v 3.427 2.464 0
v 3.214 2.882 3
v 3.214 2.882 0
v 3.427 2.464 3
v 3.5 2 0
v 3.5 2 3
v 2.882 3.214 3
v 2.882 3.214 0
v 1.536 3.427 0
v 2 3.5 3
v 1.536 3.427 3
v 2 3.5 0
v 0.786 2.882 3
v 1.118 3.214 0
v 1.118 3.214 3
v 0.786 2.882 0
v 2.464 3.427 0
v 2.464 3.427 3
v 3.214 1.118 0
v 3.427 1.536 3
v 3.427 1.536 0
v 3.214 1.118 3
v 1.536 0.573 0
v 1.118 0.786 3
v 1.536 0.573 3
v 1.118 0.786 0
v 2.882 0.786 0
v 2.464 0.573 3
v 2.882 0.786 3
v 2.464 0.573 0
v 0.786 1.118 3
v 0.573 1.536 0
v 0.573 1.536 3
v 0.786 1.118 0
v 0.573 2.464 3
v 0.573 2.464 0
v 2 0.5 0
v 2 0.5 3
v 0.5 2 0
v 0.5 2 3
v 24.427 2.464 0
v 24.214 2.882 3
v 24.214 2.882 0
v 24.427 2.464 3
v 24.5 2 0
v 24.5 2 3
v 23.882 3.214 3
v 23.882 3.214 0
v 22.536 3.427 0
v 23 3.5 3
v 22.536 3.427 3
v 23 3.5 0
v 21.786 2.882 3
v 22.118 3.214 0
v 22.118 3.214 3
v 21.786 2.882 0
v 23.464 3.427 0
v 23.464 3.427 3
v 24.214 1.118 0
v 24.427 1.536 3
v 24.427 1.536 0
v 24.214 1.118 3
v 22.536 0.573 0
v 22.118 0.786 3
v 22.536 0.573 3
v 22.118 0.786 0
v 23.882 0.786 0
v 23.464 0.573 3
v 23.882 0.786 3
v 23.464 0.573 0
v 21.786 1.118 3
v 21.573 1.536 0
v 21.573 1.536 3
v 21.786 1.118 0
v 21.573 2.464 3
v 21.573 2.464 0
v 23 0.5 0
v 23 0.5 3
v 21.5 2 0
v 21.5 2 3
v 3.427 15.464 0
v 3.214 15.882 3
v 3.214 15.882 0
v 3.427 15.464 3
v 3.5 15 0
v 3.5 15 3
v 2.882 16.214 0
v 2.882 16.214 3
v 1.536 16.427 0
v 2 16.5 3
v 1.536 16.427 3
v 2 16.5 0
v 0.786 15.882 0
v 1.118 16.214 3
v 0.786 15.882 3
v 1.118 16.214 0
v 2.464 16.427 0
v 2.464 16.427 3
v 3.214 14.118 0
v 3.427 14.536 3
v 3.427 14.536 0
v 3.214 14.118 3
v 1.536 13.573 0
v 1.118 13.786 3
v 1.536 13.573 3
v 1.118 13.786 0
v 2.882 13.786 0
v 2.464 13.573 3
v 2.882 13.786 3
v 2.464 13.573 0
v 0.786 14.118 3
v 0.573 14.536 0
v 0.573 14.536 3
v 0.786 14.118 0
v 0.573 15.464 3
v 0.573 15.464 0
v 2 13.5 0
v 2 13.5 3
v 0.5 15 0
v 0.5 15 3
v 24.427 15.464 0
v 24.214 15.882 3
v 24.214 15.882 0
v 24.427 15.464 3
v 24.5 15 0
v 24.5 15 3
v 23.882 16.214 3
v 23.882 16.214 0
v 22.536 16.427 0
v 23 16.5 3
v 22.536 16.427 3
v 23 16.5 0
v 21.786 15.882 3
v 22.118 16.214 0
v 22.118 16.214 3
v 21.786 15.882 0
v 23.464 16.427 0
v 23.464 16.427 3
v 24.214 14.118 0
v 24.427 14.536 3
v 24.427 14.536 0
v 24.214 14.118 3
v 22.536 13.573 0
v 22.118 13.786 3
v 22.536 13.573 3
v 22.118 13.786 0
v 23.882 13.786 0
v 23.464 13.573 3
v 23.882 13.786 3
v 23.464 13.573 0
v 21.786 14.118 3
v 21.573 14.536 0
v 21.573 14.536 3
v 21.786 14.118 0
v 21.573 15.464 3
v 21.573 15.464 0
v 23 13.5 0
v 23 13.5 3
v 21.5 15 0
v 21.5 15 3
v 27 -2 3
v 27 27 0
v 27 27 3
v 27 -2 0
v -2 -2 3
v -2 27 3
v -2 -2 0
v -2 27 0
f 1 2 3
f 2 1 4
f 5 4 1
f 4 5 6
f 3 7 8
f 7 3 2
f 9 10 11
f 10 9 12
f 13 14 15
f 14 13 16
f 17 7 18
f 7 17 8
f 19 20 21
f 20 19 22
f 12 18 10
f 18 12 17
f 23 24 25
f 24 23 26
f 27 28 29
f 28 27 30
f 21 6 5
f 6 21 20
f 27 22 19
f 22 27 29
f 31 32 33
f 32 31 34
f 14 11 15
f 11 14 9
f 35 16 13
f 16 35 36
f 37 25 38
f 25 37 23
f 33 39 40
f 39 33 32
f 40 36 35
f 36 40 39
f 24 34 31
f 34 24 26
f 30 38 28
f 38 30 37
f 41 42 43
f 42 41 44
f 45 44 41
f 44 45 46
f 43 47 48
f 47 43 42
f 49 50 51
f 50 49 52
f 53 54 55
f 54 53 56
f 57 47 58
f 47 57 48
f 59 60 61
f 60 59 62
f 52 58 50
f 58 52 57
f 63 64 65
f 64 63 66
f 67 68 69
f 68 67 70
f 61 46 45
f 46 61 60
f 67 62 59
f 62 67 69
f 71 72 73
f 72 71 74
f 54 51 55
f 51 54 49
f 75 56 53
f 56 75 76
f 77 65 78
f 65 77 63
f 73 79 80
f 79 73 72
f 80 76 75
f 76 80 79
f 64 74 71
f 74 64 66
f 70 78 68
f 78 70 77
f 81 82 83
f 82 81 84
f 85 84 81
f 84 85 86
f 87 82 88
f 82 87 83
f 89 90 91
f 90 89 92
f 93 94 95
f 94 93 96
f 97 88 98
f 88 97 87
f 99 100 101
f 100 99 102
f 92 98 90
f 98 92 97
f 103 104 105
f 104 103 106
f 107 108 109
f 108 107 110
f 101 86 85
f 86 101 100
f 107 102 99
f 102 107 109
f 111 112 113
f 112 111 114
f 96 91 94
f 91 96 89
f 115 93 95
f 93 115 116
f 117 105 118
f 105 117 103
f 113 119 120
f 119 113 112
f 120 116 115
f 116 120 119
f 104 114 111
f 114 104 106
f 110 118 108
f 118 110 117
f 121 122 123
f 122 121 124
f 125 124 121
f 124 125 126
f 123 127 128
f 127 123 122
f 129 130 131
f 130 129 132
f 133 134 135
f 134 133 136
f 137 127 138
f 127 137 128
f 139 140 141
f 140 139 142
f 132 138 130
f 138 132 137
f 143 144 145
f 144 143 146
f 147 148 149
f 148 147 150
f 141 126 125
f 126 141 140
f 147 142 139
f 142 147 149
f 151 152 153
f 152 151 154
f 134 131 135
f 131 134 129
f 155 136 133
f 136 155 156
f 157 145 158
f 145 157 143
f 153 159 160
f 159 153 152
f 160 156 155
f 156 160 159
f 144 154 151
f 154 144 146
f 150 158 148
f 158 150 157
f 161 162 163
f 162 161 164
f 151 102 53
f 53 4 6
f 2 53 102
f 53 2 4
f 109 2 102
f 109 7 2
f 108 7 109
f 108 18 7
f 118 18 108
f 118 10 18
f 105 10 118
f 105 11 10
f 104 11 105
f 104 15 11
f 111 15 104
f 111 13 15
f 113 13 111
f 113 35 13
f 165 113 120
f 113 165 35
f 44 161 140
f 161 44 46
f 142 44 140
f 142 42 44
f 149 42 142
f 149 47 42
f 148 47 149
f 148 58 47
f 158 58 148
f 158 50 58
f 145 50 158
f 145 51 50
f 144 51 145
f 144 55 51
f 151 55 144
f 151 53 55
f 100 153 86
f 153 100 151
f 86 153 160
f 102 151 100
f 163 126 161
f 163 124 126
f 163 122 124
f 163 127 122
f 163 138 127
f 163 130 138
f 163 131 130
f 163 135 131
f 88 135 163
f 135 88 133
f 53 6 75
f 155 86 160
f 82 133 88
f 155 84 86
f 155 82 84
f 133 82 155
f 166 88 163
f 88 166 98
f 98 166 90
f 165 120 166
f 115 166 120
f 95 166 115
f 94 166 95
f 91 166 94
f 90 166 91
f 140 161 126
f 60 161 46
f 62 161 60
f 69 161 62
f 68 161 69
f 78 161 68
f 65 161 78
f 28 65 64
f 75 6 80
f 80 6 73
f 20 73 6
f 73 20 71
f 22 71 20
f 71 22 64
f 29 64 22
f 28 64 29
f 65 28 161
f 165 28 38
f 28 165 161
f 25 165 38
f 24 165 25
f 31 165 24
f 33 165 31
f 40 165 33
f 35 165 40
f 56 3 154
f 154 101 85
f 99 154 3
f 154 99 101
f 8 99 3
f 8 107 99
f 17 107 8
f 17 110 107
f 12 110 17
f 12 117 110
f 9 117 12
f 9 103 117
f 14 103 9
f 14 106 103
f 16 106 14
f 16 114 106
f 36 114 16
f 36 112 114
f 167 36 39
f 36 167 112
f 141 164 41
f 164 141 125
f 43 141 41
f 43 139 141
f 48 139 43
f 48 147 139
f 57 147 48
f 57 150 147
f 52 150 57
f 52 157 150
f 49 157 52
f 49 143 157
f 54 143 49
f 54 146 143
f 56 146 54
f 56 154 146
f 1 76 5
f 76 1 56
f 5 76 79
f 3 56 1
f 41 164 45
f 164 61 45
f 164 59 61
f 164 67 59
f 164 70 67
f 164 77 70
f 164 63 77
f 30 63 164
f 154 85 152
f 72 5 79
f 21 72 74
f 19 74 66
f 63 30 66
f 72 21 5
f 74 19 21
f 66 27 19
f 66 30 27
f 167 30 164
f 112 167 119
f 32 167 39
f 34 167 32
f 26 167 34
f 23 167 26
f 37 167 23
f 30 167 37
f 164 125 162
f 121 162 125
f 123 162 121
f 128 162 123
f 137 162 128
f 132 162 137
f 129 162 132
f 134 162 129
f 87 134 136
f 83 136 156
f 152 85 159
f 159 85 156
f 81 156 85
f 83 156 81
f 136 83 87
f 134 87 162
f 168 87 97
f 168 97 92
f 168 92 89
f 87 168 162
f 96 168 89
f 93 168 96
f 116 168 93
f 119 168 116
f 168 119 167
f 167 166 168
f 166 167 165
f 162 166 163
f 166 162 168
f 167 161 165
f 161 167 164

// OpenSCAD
/// Camera holder piece for a Raspberry PI camera module (non-HQ)
$fn=20;

// height is along the axis of the camera connector
camera_board_height = 25;
camera_board_width = 25;

mounting_holes_radius = 1.5;
// Shared x offset by outer and inner mounting holes
mounting_holes_x_offset = 2;
mounting_holes_y_offset_outer = 2;
mounting_holes_y_offset_inner = 15;

camera_holder_depth = 3;
// Padding per x and y side
// (e.g. padding of 2 will result in total padding of 4 along the axis)
camera_holder_padding = 2;

camera_holder();

module camera_holder() {
    difference(){
        translate([-camera_holder_padding, -camera_holder_padding, 0]){
            cube([
                camera_board_height + camera_holder_padding * 2,
                camera_board_width + camera_holder_padding * 2,
                camera_holder_depth,
            ]);
        }
        mounting_holes();
    }
}

module mounting_holes() {
    translate([mounting_holes_x_offset, mounting_holes_y_offset_outer, -camera_holder_depth]) {
            cylinder(h=camera_holder_depth * 3, r=mounting_holes_radius);

    }
    translate([camera_board_height - mounting_holes_x_offset, mounting_holes_y_offset_outer, -camera_holder_depth]) {
            cylinder(h=camera_holder_depth * 3, r=mounting_holes_radius);

    }
    translate([mounting_holes_x_offset, mounting_holes_y_offset_inner, -camera_holder_depth]) {
            cylinder(h=camera_holder_depth * 3, r=mounting_holes_radius);

    }
    translate([camera_board_height - mounting_holes_x_offset, mounting_holes_y_offset_inner, -camera_holder_depth]) {
            cylinder(h=camera_holder_depth * 3, r=mounting_holes_radius);

    }
}
